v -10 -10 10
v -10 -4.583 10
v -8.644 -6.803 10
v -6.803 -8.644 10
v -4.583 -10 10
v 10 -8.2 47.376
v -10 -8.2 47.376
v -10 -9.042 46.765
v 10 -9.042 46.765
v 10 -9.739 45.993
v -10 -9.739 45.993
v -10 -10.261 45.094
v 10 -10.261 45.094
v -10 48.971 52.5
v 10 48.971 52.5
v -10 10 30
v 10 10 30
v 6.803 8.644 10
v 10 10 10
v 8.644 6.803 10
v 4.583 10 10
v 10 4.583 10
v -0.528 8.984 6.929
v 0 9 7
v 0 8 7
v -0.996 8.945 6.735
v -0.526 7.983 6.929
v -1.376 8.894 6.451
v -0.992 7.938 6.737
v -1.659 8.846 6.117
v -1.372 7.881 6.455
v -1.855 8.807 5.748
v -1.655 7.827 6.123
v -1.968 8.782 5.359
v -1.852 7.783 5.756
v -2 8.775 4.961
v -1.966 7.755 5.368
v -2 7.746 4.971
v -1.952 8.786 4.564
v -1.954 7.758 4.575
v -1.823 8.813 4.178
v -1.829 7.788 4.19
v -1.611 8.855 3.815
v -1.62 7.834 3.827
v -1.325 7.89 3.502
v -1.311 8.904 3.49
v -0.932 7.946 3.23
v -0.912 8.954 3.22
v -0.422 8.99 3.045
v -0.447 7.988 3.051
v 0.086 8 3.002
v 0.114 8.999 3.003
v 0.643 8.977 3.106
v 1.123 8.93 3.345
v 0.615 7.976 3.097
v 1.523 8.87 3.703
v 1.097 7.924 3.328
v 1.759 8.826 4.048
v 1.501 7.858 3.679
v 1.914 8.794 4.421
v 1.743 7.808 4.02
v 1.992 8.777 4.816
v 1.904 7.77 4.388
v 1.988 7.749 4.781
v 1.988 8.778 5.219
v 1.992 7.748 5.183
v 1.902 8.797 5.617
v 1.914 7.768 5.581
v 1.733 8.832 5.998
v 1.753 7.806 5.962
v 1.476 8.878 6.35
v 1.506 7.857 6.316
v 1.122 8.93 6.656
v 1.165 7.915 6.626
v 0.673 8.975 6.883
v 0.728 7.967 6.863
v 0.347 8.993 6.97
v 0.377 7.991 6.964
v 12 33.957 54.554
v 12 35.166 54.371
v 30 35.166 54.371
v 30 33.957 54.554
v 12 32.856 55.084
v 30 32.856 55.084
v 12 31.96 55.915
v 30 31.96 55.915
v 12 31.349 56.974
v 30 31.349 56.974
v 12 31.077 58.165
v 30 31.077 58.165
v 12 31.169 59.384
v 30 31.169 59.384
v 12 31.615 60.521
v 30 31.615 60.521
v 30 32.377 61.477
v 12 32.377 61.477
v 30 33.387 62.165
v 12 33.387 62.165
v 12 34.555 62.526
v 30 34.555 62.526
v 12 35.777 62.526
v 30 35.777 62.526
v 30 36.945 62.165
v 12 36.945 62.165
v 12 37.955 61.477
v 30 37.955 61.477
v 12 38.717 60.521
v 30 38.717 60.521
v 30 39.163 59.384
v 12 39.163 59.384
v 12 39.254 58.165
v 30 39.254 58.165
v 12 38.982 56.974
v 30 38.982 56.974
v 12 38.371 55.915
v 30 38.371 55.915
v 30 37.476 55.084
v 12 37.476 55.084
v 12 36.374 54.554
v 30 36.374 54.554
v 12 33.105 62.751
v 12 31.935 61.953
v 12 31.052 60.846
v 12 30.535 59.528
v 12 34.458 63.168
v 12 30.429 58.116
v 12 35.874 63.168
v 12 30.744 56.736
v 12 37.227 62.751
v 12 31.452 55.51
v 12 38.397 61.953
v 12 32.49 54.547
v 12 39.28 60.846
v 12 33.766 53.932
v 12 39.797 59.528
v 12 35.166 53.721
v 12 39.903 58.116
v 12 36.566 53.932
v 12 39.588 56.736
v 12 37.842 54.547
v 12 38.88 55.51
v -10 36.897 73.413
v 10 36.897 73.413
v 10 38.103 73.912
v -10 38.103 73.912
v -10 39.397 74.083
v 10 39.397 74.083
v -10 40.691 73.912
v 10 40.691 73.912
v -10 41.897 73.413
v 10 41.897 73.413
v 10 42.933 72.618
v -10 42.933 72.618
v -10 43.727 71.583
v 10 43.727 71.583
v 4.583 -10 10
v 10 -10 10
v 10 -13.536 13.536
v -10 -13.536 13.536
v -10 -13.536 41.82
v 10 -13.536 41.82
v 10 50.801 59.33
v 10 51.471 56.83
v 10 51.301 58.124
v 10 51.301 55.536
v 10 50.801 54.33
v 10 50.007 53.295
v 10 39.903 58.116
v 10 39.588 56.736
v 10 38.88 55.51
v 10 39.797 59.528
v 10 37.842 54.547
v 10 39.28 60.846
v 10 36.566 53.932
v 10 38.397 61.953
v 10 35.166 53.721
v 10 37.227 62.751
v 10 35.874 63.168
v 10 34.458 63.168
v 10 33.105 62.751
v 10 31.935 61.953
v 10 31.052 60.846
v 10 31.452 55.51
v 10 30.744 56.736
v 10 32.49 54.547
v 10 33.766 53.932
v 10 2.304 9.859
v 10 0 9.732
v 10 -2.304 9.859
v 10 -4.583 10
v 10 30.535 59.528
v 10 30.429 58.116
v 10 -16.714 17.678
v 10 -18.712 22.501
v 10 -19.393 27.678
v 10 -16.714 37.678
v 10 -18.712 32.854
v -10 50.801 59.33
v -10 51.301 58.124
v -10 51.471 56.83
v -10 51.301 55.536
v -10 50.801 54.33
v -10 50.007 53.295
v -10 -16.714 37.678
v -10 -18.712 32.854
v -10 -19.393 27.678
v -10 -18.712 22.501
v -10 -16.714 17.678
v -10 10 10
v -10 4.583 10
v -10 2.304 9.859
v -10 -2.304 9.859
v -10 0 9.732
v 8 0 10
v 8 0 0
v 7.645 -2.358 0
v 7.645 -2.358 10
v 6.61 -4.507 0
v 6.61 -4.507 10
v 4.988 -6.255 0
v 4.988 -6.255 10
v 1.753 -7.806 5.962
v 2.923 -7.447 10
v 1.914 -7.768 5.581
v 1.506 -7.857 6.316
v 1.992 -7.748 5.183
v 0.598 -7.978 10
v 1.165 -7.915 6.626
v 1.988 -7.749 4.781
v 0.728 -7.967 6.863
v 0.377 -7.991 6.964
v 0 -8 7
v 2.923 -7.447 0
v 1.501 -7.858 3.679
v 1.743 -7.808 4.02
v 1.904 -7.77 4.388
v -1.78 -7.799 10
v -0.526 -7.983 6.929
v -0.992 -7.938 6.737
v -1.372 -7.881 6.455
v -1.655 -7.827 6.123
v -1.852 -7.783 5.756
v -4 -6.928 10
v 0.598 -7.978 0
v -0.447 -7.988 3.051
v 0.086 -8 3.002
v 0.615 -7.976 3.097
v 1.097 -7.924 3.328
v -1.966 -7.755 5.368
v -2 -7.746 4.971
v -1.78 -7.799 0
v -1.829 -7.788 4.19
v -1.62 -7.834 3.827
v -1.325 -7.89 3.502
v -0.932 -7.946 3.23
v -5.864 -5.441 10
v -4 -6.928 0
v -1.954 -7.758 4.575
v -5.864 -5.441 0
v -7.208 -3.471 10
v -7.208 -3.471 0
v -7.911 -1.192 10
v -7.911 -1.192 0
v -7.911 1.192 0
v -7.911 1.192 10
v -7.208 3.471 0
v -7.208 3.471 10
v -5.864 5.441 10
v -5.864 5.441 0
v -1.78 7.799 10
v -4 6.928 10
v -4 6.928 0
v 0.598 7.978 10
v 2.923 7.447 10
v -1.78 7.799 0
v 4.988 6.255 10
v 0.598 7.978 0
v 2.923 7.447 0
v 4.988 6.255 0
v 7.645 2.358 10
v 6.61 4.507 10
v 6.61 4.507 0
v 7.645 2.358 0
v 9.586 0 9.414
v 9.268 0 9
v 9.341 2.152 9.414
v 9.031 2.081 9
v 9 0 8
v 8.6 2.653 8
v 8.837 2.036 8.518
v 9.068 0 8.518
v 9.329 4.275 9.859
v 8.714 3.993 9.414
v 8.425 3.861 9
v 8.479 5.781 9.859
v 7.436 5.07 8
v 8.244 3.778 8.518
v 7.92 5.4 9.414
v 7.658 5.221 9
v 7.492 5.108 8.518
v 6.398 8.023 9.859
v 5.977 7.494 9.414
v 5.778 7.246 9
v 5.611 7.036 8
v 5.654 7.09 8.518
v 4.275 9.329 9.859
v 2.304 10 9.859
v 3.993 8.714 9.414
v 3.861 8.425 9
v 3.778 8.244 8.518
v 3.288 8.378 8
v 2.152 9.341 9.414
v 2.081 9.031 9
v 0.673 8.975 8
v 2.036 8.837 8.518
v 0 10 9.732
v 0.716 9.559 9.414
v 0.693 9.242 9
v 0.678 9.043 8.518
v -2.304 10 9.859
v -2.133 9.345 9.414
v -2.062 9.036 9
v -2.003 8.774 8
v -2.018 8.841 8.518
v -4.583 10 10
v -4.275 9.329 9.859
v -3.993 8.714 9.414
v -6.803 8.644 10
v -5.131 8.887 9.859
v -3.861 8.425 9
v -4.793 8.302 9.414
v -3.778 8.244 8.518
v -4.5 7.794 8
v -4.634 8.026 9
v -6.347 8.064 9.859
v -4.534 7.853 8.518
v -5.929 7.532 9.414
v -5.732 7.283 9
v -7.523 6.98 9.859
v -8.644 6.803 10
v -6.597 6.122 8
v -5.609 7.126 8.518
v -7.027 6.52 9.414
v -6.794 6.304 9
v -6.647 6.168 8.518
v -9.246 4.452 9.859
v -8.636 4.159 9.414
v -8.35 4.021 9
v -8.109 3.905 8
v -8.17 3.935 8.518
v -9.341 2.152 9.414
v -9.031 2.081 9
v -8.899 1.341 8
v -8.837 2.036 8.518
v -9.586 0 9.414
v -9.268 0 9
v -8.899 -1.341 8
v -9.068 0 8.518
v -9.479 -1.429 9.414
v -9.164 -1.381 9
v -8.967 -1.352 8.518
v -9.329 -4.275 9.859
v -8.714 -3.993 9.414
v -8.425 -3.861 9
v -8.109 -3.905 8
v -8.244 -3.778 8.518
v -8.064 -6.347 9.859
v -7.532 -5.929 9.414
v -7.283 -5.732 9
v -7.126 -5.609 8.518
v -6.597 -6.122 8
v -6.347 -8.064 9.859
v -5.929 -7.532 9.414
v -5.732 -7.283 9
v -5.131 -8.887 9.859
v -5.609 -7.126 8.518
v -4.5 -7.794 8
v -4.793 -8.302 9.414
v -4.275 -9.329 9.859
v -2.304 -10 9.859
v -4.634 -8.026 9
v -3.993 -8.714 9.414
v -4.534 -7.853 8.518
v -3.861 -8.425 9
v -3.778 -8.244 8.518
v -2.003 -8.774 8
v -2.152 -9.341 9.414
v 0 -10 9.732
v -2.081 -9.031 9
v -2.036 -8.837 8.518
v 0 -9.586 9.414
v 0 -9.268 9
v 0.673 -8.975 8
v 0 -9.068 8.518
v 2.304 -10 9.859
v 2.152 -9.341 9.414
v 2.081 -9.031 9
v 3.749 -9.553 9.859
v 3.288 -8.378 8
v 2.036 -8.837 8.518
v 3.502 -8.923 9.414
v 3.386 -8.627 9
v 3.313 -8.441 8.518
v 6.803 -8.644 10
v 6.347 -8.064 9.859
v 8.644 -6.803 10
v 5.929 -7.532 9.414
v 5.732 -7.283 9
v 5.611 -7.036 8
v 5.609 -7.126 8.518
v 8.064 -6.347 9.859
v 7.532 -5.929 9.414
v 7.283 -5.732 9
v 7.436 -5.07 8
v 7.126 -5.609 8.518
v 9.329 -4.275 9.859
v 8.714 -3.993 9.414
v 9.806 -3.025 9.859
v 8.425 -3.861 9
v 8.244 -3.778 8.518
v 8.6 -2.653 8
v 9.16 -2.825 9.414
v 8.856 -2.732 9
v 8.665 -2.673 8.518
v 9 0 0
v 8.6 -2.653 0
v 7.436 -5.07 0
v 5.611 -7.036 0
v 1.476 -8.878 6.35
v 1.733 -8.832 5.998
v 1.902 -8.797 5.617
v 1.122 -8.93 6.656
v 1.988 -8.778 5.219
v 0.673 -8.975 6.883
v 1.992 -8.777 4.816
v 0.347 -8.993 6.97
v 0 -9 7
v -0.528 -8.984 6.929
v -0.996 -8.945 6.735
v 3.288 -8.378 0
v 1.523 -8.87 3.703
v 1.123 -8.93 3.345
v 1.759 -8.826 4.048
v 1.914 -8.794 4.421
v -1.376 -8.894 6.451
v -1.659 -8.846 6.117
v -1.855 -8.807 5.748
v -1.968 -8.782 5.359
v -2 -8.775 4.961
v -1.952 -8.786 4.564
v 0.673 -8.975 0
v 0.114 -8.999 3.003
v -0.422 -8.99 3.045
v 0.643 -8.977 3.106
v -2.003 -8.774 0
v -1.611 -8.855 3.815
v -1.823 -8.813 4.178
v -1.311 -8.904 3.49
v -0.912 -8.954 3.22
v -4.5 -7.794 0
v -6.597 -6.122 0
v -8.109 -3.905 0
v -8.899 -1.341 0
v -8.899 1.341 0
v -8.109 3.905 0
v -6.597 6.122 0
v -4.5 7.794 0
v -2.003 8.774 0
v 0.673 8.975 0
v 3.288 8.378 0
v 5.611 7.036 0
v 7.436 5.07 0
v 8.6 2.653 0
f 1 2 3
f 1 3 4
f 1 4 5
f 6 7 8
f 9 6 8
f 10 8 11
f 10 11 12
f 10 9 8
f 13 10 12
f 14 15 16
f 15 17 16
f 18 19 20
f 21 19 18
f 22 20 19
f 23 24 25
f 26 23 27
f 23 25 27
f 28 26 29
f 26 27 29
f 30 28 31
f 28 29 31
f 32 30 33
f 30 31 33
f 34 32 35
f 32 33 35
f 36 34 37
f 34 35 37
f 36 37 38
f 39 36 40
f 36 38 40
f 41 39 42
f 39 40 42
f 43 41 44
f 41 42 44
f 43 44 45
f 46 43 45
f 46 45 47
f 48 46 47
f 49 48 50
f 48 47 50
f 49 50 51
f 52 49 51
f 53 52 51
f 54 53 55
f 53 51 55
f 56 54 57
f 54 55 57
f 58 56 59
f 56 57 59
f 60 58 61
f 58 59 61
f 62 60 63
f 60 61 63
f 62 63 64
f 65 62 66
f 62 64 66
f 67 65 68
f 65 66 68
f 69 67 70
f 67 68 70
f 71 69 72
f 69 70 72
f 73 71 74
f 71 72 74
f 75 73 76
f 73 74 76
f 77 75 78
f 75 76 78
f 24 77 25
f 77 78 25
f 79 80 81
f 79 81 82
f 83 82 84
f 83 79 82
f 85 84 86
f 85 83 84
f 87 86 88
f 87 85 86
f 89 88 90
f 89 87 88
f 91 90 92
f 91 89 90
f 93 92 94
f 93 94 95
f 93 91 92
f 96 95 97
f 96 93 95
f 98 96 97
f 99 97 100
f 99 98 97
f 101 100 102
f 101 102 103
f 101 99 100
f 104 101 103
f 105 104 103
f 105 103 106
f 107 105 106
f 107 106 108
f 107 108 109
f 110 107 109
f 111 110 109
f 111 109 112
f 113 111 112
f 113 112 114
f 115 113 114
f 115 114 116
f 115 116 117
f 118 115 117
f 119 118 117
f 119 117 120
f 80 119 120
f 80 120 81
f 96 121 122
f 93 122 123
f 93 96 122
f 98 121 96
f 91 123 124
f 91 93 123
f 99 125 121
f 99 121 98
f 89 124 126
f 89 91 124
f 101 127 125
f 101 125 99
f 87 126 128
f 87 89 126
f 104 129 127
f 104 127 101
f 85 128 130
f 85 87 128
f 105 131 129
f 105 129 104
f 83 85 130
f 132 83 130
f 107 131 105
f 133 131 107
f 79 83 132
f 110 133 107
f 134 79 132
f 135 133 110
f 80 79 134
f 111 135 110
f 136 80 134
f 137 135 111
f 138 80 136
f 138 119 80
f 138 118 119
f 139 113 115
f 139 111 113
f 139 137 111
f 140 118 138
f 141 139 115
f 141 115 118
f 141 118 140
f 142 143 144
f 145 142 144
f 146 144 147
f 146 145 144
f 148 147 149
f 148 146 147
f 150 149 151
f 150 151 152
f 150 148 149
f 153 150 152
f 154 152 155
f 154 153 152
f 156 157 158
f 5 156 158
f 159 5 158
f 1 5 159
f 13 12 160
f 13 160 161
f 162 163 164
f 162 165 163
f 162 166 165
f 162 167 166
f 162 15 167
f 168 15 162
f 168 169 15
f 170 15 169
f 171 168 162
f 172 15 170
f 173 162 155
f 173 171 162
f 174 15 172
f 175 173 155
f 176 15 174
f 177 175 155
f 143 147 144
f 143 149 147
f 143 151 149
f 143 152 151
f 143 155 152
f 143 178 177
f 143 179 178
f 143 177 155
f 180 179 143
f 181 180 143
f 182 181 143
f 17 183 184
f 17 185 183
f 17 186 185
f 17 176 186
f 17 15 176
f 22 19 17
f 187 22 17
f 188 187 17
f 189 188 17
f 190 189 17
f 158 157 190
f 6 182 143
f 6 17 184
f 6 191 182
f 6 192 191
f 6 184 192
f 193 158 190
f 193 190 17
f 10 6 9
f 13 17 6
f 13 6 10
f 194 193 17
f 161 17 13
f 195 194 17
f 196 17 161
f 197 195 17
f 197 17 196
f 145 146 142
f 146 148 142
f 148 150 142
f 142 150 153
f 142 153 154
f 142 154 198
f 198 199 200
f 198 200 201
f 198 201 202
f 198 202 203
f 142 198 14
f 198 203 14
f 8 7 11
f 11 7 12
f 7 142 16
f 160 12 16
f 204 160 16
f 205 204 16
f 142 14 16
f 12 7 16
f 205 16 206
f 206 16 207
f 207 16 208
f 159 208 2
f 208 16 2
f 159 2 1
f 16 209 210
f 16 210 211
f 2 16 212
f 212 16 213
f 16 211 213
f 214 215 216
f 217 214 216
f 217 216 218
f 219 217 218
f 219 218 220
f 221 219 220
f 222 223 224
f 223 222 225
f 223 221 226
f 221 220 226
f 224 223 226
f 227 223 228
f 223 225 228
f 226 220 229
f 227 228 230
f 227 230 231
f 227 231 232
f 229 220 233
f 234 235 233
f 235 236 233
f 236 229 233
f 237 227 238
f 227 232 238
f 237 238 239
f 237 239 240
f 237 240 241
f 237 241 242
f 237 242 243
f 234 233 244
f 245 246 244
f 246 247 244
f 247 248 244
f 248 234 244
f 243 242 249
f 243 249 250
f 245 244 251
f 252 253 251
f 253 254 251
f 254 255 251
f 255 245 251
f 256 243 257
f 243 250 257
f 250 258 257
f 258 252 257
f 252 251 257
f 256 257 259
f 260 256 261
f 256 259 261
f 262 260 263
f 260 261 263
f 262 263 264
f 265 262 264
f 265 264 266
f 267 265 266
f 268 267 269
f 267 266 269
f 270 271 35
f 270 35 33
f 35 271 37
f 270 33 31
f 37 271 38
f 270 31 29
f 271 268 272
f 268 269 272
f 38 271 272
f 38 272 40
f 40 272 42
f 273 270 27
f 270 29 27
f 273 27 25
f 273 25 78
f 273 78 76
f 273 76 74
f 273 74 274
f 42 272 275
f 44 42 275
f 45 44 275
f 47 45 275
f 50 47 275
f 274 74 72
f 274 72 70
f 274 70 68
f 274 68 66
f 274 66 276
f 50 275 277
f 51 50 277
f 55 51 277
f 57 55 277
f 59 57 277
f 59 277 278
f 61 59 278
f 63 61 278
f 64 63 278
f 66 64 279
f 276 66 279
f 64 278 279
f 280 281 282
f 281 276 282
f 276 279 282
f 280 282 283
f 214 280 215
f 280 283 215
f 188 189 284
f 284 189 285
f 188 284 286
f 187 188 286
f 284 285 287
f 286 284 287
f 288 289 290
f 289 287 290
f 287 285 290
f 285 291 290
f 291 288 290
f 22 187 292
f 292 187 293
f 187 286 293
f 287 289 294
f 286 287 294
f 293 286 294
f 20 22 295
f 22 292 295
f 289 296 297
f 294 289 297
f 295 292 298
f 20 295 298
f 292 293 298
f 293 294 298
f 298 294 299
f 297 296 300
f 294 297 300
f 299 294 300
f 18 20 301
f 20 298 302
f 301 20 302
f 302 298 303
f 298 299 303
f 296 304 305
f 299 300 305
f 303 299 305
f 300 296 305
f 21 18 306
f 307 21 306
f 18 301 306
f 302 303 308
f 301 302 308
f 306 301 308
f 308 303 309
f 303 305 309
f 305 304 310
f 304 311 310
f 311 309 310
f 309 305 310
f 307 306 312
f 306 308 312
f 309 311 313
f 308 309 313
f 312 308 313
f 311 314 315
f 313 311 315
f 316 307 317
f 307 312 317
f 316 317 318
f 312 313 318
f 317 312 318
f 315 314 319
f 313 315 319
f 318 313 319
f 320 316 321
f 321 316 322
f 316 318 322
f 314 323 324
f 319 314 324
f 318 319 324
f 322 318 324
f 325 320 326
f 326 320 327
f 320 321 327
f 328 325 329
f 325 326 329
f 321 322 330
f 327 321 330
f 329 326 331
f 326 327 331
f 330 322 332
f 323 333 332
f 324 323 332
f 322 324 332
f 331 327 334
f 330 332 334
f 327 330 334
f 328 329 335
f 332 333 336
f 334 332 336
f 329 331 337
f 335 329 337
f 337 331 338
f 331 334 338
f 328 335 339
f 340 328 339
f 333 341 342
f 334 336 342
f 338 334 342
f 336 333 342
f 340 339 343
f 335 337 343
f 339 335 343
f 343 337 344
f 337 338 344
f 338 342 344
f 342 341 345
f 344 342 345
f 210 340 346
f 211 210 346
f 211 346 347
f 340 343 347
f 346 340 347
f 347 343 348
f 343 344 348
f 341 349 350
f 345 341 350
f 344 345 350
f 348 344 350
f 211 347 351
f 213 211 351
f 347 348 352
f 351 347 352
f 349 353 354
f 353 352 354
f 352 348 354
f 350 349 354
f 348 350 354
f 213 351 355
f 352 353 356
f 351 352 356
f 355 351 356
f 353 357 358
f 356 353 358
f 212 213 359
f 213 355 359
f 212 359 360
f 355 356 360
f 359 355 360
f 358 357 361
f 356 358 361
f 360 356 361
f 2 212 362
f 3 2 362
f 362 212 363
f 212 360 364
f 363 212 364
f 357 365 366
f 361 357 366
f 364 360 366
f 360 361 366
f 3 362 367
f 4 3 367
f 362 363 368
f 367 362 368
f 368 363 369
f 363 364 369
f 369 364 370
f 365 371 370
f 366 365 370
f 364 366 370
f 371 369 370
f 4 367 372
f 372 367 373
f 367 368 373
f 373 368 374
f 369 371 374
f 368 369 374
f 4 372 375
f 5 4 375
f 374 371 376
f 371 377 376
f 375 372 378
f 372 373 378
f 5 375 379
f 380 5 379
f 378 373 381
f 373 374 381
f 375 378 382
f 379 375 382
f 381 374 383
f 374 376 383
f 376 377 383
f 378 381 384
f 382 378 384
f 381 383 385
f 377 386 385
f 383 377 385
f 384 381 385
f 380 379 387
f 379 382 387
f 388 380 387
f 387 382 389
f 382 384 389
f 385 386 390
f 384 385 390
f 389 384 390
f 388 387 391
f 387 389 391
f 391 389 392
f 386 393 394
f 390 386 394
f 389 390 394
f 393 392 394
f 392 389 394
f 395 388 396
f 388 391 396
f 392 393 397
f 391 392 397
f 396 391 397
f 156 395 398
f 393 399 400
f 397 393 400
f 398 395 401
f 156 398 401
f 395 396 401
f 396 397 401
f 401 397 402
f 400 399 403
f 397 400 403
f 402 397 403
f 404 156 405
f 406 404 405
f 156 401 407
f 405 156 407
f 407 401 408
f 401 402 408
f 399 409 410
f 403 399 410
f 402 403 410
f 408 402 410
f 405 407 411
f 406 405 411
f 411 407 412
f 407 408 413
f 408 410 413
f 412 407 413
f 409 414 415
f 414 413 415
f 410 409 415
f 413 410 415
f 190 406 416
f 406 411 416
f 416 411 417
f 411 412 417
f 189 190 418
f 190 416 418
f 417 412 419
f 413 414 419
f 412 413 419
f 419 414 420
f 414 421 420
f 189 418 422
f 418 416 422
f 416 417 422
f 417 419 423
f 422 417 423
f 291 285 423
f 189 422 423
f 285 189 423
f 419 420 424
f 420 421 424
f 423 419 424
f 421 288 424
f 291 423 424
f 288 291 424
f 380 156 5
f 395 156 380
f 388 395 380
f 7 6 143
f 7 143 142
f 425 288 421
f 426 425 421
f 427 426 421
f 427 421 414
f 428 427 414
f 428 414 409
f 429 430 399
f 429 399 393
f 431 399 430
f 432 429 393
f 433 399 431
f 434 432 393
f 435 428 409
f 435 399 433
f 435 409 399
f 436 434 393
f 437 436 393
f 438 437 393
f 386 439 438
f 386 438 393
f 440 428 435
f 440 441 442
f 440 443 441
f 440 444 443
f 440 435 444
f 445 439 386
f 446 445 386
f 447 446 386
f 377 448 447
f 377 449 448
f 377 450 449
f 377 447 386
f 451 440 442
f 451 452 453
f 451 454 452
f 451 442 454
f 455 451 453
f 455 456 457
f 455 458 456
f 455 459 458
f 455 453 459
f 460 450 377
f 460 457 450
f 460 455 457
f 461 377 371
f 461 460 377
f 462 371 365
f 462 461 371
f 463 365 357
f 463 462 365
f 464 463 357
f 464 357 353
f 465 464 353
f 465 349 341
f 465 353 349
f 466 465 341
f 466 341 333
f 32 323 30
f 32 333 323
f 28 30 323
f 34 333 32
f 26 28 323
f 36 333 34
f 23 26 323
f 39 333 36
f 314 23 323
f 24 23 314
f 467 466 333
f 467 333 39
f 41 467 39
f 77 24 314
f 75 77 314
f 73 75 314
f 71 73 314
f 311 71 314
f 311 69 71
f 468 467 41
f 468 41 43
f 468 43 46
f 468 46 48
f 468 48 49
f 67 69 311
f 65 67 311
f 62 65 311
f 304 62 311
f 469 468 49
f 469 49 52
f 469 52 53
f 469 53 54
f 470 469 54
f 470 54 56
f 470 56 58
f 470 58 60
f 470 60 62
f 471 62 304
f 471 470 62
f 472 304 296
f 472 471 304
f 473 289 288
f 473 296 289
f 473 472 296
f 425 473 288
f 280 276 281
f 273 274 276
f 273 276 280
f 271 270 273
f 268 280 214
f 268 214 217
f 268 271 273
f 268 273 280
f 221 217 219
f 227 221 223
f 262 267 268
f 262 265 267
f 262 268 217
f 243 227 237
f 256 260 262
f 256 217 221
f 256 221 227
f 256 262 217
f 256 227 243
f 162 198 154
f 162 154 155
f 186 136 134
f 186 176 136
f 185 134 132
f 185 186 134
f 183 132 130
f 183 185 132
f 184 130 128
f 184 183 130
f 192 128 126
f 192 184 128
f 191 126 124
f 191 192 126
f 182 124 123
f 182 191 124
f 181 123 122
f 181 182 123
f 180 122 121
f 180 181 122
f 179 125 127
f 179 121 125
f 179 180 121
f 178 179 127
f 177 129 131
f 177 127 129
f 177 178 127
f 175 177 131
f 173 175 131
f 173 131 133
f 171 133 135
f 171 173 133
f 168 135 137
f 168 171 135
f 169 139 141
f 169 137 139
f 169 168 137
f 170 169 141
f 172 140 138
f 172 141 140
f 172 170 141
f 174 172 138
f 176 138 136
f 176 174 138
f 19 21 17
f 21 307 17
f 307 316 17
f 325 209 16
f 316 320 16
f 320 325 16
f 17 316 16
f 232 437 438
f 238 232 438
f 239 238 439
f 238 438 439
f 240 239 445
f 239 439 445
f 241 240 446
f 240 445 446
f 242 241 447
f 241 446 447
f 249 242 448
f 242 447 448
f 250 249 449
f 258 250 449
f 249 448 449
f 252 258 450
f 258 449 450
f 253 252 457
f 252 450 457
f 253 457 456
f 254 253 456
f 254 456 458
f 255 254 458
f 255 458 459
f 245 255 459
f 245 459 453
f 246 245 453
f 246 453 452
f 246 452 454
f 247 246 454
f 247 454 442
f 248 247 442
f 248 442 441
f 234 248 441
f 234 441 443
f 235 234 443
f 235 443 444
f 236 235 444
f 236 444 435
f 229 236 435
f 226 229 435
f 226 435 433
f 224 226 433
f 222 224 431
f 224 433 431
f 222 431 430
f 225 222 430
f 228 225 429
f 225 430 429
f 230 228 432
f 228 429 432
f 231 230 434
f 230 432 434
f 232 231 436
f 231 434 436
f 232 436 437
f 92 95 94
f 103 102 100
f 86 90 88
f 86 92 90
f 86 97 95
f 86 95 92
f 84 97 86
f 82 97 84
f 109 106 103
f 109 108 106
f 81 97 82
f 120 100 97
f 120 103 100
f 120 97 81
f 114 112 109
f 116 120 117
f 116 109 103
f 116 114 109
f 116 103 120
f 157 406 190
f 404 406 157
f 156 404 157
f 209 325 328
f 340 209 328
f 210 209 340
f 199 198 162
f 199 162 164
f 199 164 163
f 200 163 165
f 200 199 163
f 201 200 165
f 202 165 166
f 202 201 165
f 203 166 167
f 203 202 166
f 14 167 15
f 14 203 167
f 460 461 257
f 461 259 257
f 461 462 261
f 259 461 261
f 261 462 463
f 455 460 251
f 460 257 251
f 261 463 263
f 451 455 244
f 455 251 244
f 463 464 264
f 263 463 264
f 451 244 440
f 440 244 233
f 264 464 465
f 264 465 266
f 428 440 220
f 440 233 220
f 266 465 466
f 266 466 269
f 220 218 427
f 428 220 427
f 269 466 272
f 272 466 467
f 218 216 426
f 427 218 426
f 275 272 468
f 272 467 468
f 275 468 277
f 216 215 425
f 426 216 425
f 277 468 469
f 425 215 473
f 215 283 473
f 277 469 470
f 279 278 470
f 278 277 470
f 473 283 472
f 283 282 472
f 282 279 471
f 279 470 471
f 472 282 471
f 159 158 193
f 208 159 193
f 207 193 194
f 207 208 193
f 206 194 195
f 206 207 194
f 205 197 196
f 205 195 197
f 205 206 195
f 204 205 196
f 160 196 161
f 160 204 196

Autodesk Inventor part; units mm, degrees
sketch "Esquisse1" plane through (0, 0, 0) normal (0, 0, 1) x (1, 0, 0)
  circle A0 centre (0, 0) radius 8
  circle A1 centre (0, 0) radius 9
  dimension "d0" = 16
  dimension "d1" = 18
extrude "Extrusion1" add sketch "Esquisse1" along normal blind 10
sketch "Esquisse2" plane through (0, 0, 0) normal (1, 0, 0) x (0, 1, 0)
  line L0 (9, 10) -> (-9, 10) projected
  line L1 (0, 10) -> (0, 25)
  line L2 (9, 10) -> (-9, 10)
  line L3 (0, 10) -> (10, 10)
  line L4 (10, 10) -> (10, 30)
  line L5 (10, 30) -> (-10, 30)
  line L6 (-10, 30) -> (-10, 10)
  line L7 (-10, 10) -> (0, 10)
  point P0 (0, 0)
  dimension "d26" = 10
  dimension "d27" = 20
  dimension "d28" = 20
  dimension "d29" = 90
extrude "Extrusion2" add sketch "Esquisse2" along normal mid plane 20
fillet "Congé1" radius 2 1 edges at (-9, 0, 10)
sketch "Esquisse4" plane through (0, 0, 0) normal (0, 1, 0) x (-1, 0, 0)
  line L0 (9, 0) -> (-9, 0) projected
  line L1 (9, 0) -> (0, 0)
  line L2 (0, 0) -> (0, 5)
  line L3 (0, 0) -> (5, 0) construction
  dimension "d14" = 9
  dimension "d15" = 5
  dimension "d16" = 90
hole "Perçage1" at (0, 0, 5) direction (0, -1, 0) diameter 4 end through all both
ref_plane "Plan de construction2" through (0, -8.75, 15.1554) normal (0, -0.5, 0.8660254) x (1, 0, 0)
ref_plane "Plan de construction1" through (0, 0, 0) normal (0, -0.5, 0.8660254) x (1, 0, 0)
ref_plane "Plan de construction4" through (0, -10, 10) normal (0, -0.7071068, 0.7071068) x (1, 0, 0)
ref_plane "Plan de construction3" through (0, 0, 0) normal (0, -0.7071068, 0.7071068) x (1, 0, 0)
sketch "Esquisse6" plane through (0, -10, 10) normal (0, -0.7071068, 0.7071068) x (1, 0, 0)
  line L0 (-10, 28.2843) -> (-10, 14.1421) projected
  line L1 (10, 14.1421) -> (10, 0) projected
  line L2 (-10, 28.2843) -> (10, 28.2843)
  line L3 (10, 28.2843) -> (10, 0)
  line L4 (10, 0) -> (-10, 0)
  line L5 (-10, 0) -> (-10, 28.2843)
  line L6 (-10, 28.2843) -> (10, 28.2843) projected
  line L7 (10, 14.1421) -> (10, 28.2843) projected
  line L8 (4.5826, 14.1421) -> (10, 14.1421) projected
  line L9 (-10, 14.1421) -> (-4.5826, 14.1421) projected
  line L10 (-10, 28.2843) -> (-10, 14.1421) projected
  point P0 (0, 0)
extrude "Extrusion4" add sketch "Esquisse6" along normal blind 25
fillet "Congé4" radius 20 1 edges at (0, -27.6777, 27.6777)
ref_plane "Plan de construction5" through (0, 10, 30) normal (0, 0.8660254, 0.5) x (1, 0, 0)
ref_plane "Plan de construction7" through (0, 10, 30) normal (0, -0.5, 0.8660254) x (1, 0, 0)
ref_plane "Plan de construction6" through (0, 1.3397, 25) normal (0, 0.8660254, 0.5) x (1, 0, 0)
sketch "Esquisse18" plane through (0, 1.3397, 25) normal (0, 0.8660254, 0.5) x (1, 0, 0)
  line L0 (10, -0.0001) -> (-10, -0.0001) projected
  line L1 (-10, -0.0001) -> (-10, -24.1482) projected
  line L2 (10, -24.1482) -> (-10, -24.1482) projected
  line L3 (10, -0.0001) -> (10, -24.1482) projected
  line L4 (10, -0.0001) -> (-10, -0.0001) projected
  line L5 (-10, -0.0001) -> (-10, -24.1482) projected
  line L6 (10, -24.1482) -> (-10, -24.1482) projected
  line L7 (10, -0.0001) -> (10, -24.1482) projected
  point P0 (0, 20.9808)
extrude "Extrusion14" add sketch "Esquisse18" along normal blind 60
fillet "Congé6" radius 5 1 edges at (0, -10.7344, 45.913)
sketch "Esquisse19" plane through (10, 0, 0) normal (1, 0, 0) x (0, 0, -1)
  line L0 (-30, 10) -> (-55.0001, 53.3012) projected
  line L1 (-55.0001, 53.3012) -> (-65.4564, 47.2642)
  line L2 (-47.3761, -8.2002) -> (-75.913, 41.2272) projected
  line L3 (-65.4564, 47.2642) -> (-58.4714, 35.1659)
  circle A0 centre (-58.4714, 35.1659) radius 4.1
  point P0 (0, 0)
  dimension "d76" = 12.074
  dimension "d77" = 13.97
  dimension "d78" = 8.2
extrude "Extrusion15" add sketch "Esquisse19" along normal blind 20
sketch "Esquisse20" plane through (10, 0, 0) normal (1, 0, 0) x (0, 0, -1)
  circle A0 centre (-58.4714, 35.1659) radius 4.1 projected
  circle A1 centre (-58.4714, 35.1659) radius 4.75
  point P0 (0, 0)
  dimension "d81" = 9.5
extrude "Extrusion16" add sketch "Esquisse20" along normal blind 2
fillet "Congé7" radius 5 2 edges at (0, 53.3012, 55.0001) (0, 41.2272, 75.913)
properties part number "bielle roue milieu autre côté"
